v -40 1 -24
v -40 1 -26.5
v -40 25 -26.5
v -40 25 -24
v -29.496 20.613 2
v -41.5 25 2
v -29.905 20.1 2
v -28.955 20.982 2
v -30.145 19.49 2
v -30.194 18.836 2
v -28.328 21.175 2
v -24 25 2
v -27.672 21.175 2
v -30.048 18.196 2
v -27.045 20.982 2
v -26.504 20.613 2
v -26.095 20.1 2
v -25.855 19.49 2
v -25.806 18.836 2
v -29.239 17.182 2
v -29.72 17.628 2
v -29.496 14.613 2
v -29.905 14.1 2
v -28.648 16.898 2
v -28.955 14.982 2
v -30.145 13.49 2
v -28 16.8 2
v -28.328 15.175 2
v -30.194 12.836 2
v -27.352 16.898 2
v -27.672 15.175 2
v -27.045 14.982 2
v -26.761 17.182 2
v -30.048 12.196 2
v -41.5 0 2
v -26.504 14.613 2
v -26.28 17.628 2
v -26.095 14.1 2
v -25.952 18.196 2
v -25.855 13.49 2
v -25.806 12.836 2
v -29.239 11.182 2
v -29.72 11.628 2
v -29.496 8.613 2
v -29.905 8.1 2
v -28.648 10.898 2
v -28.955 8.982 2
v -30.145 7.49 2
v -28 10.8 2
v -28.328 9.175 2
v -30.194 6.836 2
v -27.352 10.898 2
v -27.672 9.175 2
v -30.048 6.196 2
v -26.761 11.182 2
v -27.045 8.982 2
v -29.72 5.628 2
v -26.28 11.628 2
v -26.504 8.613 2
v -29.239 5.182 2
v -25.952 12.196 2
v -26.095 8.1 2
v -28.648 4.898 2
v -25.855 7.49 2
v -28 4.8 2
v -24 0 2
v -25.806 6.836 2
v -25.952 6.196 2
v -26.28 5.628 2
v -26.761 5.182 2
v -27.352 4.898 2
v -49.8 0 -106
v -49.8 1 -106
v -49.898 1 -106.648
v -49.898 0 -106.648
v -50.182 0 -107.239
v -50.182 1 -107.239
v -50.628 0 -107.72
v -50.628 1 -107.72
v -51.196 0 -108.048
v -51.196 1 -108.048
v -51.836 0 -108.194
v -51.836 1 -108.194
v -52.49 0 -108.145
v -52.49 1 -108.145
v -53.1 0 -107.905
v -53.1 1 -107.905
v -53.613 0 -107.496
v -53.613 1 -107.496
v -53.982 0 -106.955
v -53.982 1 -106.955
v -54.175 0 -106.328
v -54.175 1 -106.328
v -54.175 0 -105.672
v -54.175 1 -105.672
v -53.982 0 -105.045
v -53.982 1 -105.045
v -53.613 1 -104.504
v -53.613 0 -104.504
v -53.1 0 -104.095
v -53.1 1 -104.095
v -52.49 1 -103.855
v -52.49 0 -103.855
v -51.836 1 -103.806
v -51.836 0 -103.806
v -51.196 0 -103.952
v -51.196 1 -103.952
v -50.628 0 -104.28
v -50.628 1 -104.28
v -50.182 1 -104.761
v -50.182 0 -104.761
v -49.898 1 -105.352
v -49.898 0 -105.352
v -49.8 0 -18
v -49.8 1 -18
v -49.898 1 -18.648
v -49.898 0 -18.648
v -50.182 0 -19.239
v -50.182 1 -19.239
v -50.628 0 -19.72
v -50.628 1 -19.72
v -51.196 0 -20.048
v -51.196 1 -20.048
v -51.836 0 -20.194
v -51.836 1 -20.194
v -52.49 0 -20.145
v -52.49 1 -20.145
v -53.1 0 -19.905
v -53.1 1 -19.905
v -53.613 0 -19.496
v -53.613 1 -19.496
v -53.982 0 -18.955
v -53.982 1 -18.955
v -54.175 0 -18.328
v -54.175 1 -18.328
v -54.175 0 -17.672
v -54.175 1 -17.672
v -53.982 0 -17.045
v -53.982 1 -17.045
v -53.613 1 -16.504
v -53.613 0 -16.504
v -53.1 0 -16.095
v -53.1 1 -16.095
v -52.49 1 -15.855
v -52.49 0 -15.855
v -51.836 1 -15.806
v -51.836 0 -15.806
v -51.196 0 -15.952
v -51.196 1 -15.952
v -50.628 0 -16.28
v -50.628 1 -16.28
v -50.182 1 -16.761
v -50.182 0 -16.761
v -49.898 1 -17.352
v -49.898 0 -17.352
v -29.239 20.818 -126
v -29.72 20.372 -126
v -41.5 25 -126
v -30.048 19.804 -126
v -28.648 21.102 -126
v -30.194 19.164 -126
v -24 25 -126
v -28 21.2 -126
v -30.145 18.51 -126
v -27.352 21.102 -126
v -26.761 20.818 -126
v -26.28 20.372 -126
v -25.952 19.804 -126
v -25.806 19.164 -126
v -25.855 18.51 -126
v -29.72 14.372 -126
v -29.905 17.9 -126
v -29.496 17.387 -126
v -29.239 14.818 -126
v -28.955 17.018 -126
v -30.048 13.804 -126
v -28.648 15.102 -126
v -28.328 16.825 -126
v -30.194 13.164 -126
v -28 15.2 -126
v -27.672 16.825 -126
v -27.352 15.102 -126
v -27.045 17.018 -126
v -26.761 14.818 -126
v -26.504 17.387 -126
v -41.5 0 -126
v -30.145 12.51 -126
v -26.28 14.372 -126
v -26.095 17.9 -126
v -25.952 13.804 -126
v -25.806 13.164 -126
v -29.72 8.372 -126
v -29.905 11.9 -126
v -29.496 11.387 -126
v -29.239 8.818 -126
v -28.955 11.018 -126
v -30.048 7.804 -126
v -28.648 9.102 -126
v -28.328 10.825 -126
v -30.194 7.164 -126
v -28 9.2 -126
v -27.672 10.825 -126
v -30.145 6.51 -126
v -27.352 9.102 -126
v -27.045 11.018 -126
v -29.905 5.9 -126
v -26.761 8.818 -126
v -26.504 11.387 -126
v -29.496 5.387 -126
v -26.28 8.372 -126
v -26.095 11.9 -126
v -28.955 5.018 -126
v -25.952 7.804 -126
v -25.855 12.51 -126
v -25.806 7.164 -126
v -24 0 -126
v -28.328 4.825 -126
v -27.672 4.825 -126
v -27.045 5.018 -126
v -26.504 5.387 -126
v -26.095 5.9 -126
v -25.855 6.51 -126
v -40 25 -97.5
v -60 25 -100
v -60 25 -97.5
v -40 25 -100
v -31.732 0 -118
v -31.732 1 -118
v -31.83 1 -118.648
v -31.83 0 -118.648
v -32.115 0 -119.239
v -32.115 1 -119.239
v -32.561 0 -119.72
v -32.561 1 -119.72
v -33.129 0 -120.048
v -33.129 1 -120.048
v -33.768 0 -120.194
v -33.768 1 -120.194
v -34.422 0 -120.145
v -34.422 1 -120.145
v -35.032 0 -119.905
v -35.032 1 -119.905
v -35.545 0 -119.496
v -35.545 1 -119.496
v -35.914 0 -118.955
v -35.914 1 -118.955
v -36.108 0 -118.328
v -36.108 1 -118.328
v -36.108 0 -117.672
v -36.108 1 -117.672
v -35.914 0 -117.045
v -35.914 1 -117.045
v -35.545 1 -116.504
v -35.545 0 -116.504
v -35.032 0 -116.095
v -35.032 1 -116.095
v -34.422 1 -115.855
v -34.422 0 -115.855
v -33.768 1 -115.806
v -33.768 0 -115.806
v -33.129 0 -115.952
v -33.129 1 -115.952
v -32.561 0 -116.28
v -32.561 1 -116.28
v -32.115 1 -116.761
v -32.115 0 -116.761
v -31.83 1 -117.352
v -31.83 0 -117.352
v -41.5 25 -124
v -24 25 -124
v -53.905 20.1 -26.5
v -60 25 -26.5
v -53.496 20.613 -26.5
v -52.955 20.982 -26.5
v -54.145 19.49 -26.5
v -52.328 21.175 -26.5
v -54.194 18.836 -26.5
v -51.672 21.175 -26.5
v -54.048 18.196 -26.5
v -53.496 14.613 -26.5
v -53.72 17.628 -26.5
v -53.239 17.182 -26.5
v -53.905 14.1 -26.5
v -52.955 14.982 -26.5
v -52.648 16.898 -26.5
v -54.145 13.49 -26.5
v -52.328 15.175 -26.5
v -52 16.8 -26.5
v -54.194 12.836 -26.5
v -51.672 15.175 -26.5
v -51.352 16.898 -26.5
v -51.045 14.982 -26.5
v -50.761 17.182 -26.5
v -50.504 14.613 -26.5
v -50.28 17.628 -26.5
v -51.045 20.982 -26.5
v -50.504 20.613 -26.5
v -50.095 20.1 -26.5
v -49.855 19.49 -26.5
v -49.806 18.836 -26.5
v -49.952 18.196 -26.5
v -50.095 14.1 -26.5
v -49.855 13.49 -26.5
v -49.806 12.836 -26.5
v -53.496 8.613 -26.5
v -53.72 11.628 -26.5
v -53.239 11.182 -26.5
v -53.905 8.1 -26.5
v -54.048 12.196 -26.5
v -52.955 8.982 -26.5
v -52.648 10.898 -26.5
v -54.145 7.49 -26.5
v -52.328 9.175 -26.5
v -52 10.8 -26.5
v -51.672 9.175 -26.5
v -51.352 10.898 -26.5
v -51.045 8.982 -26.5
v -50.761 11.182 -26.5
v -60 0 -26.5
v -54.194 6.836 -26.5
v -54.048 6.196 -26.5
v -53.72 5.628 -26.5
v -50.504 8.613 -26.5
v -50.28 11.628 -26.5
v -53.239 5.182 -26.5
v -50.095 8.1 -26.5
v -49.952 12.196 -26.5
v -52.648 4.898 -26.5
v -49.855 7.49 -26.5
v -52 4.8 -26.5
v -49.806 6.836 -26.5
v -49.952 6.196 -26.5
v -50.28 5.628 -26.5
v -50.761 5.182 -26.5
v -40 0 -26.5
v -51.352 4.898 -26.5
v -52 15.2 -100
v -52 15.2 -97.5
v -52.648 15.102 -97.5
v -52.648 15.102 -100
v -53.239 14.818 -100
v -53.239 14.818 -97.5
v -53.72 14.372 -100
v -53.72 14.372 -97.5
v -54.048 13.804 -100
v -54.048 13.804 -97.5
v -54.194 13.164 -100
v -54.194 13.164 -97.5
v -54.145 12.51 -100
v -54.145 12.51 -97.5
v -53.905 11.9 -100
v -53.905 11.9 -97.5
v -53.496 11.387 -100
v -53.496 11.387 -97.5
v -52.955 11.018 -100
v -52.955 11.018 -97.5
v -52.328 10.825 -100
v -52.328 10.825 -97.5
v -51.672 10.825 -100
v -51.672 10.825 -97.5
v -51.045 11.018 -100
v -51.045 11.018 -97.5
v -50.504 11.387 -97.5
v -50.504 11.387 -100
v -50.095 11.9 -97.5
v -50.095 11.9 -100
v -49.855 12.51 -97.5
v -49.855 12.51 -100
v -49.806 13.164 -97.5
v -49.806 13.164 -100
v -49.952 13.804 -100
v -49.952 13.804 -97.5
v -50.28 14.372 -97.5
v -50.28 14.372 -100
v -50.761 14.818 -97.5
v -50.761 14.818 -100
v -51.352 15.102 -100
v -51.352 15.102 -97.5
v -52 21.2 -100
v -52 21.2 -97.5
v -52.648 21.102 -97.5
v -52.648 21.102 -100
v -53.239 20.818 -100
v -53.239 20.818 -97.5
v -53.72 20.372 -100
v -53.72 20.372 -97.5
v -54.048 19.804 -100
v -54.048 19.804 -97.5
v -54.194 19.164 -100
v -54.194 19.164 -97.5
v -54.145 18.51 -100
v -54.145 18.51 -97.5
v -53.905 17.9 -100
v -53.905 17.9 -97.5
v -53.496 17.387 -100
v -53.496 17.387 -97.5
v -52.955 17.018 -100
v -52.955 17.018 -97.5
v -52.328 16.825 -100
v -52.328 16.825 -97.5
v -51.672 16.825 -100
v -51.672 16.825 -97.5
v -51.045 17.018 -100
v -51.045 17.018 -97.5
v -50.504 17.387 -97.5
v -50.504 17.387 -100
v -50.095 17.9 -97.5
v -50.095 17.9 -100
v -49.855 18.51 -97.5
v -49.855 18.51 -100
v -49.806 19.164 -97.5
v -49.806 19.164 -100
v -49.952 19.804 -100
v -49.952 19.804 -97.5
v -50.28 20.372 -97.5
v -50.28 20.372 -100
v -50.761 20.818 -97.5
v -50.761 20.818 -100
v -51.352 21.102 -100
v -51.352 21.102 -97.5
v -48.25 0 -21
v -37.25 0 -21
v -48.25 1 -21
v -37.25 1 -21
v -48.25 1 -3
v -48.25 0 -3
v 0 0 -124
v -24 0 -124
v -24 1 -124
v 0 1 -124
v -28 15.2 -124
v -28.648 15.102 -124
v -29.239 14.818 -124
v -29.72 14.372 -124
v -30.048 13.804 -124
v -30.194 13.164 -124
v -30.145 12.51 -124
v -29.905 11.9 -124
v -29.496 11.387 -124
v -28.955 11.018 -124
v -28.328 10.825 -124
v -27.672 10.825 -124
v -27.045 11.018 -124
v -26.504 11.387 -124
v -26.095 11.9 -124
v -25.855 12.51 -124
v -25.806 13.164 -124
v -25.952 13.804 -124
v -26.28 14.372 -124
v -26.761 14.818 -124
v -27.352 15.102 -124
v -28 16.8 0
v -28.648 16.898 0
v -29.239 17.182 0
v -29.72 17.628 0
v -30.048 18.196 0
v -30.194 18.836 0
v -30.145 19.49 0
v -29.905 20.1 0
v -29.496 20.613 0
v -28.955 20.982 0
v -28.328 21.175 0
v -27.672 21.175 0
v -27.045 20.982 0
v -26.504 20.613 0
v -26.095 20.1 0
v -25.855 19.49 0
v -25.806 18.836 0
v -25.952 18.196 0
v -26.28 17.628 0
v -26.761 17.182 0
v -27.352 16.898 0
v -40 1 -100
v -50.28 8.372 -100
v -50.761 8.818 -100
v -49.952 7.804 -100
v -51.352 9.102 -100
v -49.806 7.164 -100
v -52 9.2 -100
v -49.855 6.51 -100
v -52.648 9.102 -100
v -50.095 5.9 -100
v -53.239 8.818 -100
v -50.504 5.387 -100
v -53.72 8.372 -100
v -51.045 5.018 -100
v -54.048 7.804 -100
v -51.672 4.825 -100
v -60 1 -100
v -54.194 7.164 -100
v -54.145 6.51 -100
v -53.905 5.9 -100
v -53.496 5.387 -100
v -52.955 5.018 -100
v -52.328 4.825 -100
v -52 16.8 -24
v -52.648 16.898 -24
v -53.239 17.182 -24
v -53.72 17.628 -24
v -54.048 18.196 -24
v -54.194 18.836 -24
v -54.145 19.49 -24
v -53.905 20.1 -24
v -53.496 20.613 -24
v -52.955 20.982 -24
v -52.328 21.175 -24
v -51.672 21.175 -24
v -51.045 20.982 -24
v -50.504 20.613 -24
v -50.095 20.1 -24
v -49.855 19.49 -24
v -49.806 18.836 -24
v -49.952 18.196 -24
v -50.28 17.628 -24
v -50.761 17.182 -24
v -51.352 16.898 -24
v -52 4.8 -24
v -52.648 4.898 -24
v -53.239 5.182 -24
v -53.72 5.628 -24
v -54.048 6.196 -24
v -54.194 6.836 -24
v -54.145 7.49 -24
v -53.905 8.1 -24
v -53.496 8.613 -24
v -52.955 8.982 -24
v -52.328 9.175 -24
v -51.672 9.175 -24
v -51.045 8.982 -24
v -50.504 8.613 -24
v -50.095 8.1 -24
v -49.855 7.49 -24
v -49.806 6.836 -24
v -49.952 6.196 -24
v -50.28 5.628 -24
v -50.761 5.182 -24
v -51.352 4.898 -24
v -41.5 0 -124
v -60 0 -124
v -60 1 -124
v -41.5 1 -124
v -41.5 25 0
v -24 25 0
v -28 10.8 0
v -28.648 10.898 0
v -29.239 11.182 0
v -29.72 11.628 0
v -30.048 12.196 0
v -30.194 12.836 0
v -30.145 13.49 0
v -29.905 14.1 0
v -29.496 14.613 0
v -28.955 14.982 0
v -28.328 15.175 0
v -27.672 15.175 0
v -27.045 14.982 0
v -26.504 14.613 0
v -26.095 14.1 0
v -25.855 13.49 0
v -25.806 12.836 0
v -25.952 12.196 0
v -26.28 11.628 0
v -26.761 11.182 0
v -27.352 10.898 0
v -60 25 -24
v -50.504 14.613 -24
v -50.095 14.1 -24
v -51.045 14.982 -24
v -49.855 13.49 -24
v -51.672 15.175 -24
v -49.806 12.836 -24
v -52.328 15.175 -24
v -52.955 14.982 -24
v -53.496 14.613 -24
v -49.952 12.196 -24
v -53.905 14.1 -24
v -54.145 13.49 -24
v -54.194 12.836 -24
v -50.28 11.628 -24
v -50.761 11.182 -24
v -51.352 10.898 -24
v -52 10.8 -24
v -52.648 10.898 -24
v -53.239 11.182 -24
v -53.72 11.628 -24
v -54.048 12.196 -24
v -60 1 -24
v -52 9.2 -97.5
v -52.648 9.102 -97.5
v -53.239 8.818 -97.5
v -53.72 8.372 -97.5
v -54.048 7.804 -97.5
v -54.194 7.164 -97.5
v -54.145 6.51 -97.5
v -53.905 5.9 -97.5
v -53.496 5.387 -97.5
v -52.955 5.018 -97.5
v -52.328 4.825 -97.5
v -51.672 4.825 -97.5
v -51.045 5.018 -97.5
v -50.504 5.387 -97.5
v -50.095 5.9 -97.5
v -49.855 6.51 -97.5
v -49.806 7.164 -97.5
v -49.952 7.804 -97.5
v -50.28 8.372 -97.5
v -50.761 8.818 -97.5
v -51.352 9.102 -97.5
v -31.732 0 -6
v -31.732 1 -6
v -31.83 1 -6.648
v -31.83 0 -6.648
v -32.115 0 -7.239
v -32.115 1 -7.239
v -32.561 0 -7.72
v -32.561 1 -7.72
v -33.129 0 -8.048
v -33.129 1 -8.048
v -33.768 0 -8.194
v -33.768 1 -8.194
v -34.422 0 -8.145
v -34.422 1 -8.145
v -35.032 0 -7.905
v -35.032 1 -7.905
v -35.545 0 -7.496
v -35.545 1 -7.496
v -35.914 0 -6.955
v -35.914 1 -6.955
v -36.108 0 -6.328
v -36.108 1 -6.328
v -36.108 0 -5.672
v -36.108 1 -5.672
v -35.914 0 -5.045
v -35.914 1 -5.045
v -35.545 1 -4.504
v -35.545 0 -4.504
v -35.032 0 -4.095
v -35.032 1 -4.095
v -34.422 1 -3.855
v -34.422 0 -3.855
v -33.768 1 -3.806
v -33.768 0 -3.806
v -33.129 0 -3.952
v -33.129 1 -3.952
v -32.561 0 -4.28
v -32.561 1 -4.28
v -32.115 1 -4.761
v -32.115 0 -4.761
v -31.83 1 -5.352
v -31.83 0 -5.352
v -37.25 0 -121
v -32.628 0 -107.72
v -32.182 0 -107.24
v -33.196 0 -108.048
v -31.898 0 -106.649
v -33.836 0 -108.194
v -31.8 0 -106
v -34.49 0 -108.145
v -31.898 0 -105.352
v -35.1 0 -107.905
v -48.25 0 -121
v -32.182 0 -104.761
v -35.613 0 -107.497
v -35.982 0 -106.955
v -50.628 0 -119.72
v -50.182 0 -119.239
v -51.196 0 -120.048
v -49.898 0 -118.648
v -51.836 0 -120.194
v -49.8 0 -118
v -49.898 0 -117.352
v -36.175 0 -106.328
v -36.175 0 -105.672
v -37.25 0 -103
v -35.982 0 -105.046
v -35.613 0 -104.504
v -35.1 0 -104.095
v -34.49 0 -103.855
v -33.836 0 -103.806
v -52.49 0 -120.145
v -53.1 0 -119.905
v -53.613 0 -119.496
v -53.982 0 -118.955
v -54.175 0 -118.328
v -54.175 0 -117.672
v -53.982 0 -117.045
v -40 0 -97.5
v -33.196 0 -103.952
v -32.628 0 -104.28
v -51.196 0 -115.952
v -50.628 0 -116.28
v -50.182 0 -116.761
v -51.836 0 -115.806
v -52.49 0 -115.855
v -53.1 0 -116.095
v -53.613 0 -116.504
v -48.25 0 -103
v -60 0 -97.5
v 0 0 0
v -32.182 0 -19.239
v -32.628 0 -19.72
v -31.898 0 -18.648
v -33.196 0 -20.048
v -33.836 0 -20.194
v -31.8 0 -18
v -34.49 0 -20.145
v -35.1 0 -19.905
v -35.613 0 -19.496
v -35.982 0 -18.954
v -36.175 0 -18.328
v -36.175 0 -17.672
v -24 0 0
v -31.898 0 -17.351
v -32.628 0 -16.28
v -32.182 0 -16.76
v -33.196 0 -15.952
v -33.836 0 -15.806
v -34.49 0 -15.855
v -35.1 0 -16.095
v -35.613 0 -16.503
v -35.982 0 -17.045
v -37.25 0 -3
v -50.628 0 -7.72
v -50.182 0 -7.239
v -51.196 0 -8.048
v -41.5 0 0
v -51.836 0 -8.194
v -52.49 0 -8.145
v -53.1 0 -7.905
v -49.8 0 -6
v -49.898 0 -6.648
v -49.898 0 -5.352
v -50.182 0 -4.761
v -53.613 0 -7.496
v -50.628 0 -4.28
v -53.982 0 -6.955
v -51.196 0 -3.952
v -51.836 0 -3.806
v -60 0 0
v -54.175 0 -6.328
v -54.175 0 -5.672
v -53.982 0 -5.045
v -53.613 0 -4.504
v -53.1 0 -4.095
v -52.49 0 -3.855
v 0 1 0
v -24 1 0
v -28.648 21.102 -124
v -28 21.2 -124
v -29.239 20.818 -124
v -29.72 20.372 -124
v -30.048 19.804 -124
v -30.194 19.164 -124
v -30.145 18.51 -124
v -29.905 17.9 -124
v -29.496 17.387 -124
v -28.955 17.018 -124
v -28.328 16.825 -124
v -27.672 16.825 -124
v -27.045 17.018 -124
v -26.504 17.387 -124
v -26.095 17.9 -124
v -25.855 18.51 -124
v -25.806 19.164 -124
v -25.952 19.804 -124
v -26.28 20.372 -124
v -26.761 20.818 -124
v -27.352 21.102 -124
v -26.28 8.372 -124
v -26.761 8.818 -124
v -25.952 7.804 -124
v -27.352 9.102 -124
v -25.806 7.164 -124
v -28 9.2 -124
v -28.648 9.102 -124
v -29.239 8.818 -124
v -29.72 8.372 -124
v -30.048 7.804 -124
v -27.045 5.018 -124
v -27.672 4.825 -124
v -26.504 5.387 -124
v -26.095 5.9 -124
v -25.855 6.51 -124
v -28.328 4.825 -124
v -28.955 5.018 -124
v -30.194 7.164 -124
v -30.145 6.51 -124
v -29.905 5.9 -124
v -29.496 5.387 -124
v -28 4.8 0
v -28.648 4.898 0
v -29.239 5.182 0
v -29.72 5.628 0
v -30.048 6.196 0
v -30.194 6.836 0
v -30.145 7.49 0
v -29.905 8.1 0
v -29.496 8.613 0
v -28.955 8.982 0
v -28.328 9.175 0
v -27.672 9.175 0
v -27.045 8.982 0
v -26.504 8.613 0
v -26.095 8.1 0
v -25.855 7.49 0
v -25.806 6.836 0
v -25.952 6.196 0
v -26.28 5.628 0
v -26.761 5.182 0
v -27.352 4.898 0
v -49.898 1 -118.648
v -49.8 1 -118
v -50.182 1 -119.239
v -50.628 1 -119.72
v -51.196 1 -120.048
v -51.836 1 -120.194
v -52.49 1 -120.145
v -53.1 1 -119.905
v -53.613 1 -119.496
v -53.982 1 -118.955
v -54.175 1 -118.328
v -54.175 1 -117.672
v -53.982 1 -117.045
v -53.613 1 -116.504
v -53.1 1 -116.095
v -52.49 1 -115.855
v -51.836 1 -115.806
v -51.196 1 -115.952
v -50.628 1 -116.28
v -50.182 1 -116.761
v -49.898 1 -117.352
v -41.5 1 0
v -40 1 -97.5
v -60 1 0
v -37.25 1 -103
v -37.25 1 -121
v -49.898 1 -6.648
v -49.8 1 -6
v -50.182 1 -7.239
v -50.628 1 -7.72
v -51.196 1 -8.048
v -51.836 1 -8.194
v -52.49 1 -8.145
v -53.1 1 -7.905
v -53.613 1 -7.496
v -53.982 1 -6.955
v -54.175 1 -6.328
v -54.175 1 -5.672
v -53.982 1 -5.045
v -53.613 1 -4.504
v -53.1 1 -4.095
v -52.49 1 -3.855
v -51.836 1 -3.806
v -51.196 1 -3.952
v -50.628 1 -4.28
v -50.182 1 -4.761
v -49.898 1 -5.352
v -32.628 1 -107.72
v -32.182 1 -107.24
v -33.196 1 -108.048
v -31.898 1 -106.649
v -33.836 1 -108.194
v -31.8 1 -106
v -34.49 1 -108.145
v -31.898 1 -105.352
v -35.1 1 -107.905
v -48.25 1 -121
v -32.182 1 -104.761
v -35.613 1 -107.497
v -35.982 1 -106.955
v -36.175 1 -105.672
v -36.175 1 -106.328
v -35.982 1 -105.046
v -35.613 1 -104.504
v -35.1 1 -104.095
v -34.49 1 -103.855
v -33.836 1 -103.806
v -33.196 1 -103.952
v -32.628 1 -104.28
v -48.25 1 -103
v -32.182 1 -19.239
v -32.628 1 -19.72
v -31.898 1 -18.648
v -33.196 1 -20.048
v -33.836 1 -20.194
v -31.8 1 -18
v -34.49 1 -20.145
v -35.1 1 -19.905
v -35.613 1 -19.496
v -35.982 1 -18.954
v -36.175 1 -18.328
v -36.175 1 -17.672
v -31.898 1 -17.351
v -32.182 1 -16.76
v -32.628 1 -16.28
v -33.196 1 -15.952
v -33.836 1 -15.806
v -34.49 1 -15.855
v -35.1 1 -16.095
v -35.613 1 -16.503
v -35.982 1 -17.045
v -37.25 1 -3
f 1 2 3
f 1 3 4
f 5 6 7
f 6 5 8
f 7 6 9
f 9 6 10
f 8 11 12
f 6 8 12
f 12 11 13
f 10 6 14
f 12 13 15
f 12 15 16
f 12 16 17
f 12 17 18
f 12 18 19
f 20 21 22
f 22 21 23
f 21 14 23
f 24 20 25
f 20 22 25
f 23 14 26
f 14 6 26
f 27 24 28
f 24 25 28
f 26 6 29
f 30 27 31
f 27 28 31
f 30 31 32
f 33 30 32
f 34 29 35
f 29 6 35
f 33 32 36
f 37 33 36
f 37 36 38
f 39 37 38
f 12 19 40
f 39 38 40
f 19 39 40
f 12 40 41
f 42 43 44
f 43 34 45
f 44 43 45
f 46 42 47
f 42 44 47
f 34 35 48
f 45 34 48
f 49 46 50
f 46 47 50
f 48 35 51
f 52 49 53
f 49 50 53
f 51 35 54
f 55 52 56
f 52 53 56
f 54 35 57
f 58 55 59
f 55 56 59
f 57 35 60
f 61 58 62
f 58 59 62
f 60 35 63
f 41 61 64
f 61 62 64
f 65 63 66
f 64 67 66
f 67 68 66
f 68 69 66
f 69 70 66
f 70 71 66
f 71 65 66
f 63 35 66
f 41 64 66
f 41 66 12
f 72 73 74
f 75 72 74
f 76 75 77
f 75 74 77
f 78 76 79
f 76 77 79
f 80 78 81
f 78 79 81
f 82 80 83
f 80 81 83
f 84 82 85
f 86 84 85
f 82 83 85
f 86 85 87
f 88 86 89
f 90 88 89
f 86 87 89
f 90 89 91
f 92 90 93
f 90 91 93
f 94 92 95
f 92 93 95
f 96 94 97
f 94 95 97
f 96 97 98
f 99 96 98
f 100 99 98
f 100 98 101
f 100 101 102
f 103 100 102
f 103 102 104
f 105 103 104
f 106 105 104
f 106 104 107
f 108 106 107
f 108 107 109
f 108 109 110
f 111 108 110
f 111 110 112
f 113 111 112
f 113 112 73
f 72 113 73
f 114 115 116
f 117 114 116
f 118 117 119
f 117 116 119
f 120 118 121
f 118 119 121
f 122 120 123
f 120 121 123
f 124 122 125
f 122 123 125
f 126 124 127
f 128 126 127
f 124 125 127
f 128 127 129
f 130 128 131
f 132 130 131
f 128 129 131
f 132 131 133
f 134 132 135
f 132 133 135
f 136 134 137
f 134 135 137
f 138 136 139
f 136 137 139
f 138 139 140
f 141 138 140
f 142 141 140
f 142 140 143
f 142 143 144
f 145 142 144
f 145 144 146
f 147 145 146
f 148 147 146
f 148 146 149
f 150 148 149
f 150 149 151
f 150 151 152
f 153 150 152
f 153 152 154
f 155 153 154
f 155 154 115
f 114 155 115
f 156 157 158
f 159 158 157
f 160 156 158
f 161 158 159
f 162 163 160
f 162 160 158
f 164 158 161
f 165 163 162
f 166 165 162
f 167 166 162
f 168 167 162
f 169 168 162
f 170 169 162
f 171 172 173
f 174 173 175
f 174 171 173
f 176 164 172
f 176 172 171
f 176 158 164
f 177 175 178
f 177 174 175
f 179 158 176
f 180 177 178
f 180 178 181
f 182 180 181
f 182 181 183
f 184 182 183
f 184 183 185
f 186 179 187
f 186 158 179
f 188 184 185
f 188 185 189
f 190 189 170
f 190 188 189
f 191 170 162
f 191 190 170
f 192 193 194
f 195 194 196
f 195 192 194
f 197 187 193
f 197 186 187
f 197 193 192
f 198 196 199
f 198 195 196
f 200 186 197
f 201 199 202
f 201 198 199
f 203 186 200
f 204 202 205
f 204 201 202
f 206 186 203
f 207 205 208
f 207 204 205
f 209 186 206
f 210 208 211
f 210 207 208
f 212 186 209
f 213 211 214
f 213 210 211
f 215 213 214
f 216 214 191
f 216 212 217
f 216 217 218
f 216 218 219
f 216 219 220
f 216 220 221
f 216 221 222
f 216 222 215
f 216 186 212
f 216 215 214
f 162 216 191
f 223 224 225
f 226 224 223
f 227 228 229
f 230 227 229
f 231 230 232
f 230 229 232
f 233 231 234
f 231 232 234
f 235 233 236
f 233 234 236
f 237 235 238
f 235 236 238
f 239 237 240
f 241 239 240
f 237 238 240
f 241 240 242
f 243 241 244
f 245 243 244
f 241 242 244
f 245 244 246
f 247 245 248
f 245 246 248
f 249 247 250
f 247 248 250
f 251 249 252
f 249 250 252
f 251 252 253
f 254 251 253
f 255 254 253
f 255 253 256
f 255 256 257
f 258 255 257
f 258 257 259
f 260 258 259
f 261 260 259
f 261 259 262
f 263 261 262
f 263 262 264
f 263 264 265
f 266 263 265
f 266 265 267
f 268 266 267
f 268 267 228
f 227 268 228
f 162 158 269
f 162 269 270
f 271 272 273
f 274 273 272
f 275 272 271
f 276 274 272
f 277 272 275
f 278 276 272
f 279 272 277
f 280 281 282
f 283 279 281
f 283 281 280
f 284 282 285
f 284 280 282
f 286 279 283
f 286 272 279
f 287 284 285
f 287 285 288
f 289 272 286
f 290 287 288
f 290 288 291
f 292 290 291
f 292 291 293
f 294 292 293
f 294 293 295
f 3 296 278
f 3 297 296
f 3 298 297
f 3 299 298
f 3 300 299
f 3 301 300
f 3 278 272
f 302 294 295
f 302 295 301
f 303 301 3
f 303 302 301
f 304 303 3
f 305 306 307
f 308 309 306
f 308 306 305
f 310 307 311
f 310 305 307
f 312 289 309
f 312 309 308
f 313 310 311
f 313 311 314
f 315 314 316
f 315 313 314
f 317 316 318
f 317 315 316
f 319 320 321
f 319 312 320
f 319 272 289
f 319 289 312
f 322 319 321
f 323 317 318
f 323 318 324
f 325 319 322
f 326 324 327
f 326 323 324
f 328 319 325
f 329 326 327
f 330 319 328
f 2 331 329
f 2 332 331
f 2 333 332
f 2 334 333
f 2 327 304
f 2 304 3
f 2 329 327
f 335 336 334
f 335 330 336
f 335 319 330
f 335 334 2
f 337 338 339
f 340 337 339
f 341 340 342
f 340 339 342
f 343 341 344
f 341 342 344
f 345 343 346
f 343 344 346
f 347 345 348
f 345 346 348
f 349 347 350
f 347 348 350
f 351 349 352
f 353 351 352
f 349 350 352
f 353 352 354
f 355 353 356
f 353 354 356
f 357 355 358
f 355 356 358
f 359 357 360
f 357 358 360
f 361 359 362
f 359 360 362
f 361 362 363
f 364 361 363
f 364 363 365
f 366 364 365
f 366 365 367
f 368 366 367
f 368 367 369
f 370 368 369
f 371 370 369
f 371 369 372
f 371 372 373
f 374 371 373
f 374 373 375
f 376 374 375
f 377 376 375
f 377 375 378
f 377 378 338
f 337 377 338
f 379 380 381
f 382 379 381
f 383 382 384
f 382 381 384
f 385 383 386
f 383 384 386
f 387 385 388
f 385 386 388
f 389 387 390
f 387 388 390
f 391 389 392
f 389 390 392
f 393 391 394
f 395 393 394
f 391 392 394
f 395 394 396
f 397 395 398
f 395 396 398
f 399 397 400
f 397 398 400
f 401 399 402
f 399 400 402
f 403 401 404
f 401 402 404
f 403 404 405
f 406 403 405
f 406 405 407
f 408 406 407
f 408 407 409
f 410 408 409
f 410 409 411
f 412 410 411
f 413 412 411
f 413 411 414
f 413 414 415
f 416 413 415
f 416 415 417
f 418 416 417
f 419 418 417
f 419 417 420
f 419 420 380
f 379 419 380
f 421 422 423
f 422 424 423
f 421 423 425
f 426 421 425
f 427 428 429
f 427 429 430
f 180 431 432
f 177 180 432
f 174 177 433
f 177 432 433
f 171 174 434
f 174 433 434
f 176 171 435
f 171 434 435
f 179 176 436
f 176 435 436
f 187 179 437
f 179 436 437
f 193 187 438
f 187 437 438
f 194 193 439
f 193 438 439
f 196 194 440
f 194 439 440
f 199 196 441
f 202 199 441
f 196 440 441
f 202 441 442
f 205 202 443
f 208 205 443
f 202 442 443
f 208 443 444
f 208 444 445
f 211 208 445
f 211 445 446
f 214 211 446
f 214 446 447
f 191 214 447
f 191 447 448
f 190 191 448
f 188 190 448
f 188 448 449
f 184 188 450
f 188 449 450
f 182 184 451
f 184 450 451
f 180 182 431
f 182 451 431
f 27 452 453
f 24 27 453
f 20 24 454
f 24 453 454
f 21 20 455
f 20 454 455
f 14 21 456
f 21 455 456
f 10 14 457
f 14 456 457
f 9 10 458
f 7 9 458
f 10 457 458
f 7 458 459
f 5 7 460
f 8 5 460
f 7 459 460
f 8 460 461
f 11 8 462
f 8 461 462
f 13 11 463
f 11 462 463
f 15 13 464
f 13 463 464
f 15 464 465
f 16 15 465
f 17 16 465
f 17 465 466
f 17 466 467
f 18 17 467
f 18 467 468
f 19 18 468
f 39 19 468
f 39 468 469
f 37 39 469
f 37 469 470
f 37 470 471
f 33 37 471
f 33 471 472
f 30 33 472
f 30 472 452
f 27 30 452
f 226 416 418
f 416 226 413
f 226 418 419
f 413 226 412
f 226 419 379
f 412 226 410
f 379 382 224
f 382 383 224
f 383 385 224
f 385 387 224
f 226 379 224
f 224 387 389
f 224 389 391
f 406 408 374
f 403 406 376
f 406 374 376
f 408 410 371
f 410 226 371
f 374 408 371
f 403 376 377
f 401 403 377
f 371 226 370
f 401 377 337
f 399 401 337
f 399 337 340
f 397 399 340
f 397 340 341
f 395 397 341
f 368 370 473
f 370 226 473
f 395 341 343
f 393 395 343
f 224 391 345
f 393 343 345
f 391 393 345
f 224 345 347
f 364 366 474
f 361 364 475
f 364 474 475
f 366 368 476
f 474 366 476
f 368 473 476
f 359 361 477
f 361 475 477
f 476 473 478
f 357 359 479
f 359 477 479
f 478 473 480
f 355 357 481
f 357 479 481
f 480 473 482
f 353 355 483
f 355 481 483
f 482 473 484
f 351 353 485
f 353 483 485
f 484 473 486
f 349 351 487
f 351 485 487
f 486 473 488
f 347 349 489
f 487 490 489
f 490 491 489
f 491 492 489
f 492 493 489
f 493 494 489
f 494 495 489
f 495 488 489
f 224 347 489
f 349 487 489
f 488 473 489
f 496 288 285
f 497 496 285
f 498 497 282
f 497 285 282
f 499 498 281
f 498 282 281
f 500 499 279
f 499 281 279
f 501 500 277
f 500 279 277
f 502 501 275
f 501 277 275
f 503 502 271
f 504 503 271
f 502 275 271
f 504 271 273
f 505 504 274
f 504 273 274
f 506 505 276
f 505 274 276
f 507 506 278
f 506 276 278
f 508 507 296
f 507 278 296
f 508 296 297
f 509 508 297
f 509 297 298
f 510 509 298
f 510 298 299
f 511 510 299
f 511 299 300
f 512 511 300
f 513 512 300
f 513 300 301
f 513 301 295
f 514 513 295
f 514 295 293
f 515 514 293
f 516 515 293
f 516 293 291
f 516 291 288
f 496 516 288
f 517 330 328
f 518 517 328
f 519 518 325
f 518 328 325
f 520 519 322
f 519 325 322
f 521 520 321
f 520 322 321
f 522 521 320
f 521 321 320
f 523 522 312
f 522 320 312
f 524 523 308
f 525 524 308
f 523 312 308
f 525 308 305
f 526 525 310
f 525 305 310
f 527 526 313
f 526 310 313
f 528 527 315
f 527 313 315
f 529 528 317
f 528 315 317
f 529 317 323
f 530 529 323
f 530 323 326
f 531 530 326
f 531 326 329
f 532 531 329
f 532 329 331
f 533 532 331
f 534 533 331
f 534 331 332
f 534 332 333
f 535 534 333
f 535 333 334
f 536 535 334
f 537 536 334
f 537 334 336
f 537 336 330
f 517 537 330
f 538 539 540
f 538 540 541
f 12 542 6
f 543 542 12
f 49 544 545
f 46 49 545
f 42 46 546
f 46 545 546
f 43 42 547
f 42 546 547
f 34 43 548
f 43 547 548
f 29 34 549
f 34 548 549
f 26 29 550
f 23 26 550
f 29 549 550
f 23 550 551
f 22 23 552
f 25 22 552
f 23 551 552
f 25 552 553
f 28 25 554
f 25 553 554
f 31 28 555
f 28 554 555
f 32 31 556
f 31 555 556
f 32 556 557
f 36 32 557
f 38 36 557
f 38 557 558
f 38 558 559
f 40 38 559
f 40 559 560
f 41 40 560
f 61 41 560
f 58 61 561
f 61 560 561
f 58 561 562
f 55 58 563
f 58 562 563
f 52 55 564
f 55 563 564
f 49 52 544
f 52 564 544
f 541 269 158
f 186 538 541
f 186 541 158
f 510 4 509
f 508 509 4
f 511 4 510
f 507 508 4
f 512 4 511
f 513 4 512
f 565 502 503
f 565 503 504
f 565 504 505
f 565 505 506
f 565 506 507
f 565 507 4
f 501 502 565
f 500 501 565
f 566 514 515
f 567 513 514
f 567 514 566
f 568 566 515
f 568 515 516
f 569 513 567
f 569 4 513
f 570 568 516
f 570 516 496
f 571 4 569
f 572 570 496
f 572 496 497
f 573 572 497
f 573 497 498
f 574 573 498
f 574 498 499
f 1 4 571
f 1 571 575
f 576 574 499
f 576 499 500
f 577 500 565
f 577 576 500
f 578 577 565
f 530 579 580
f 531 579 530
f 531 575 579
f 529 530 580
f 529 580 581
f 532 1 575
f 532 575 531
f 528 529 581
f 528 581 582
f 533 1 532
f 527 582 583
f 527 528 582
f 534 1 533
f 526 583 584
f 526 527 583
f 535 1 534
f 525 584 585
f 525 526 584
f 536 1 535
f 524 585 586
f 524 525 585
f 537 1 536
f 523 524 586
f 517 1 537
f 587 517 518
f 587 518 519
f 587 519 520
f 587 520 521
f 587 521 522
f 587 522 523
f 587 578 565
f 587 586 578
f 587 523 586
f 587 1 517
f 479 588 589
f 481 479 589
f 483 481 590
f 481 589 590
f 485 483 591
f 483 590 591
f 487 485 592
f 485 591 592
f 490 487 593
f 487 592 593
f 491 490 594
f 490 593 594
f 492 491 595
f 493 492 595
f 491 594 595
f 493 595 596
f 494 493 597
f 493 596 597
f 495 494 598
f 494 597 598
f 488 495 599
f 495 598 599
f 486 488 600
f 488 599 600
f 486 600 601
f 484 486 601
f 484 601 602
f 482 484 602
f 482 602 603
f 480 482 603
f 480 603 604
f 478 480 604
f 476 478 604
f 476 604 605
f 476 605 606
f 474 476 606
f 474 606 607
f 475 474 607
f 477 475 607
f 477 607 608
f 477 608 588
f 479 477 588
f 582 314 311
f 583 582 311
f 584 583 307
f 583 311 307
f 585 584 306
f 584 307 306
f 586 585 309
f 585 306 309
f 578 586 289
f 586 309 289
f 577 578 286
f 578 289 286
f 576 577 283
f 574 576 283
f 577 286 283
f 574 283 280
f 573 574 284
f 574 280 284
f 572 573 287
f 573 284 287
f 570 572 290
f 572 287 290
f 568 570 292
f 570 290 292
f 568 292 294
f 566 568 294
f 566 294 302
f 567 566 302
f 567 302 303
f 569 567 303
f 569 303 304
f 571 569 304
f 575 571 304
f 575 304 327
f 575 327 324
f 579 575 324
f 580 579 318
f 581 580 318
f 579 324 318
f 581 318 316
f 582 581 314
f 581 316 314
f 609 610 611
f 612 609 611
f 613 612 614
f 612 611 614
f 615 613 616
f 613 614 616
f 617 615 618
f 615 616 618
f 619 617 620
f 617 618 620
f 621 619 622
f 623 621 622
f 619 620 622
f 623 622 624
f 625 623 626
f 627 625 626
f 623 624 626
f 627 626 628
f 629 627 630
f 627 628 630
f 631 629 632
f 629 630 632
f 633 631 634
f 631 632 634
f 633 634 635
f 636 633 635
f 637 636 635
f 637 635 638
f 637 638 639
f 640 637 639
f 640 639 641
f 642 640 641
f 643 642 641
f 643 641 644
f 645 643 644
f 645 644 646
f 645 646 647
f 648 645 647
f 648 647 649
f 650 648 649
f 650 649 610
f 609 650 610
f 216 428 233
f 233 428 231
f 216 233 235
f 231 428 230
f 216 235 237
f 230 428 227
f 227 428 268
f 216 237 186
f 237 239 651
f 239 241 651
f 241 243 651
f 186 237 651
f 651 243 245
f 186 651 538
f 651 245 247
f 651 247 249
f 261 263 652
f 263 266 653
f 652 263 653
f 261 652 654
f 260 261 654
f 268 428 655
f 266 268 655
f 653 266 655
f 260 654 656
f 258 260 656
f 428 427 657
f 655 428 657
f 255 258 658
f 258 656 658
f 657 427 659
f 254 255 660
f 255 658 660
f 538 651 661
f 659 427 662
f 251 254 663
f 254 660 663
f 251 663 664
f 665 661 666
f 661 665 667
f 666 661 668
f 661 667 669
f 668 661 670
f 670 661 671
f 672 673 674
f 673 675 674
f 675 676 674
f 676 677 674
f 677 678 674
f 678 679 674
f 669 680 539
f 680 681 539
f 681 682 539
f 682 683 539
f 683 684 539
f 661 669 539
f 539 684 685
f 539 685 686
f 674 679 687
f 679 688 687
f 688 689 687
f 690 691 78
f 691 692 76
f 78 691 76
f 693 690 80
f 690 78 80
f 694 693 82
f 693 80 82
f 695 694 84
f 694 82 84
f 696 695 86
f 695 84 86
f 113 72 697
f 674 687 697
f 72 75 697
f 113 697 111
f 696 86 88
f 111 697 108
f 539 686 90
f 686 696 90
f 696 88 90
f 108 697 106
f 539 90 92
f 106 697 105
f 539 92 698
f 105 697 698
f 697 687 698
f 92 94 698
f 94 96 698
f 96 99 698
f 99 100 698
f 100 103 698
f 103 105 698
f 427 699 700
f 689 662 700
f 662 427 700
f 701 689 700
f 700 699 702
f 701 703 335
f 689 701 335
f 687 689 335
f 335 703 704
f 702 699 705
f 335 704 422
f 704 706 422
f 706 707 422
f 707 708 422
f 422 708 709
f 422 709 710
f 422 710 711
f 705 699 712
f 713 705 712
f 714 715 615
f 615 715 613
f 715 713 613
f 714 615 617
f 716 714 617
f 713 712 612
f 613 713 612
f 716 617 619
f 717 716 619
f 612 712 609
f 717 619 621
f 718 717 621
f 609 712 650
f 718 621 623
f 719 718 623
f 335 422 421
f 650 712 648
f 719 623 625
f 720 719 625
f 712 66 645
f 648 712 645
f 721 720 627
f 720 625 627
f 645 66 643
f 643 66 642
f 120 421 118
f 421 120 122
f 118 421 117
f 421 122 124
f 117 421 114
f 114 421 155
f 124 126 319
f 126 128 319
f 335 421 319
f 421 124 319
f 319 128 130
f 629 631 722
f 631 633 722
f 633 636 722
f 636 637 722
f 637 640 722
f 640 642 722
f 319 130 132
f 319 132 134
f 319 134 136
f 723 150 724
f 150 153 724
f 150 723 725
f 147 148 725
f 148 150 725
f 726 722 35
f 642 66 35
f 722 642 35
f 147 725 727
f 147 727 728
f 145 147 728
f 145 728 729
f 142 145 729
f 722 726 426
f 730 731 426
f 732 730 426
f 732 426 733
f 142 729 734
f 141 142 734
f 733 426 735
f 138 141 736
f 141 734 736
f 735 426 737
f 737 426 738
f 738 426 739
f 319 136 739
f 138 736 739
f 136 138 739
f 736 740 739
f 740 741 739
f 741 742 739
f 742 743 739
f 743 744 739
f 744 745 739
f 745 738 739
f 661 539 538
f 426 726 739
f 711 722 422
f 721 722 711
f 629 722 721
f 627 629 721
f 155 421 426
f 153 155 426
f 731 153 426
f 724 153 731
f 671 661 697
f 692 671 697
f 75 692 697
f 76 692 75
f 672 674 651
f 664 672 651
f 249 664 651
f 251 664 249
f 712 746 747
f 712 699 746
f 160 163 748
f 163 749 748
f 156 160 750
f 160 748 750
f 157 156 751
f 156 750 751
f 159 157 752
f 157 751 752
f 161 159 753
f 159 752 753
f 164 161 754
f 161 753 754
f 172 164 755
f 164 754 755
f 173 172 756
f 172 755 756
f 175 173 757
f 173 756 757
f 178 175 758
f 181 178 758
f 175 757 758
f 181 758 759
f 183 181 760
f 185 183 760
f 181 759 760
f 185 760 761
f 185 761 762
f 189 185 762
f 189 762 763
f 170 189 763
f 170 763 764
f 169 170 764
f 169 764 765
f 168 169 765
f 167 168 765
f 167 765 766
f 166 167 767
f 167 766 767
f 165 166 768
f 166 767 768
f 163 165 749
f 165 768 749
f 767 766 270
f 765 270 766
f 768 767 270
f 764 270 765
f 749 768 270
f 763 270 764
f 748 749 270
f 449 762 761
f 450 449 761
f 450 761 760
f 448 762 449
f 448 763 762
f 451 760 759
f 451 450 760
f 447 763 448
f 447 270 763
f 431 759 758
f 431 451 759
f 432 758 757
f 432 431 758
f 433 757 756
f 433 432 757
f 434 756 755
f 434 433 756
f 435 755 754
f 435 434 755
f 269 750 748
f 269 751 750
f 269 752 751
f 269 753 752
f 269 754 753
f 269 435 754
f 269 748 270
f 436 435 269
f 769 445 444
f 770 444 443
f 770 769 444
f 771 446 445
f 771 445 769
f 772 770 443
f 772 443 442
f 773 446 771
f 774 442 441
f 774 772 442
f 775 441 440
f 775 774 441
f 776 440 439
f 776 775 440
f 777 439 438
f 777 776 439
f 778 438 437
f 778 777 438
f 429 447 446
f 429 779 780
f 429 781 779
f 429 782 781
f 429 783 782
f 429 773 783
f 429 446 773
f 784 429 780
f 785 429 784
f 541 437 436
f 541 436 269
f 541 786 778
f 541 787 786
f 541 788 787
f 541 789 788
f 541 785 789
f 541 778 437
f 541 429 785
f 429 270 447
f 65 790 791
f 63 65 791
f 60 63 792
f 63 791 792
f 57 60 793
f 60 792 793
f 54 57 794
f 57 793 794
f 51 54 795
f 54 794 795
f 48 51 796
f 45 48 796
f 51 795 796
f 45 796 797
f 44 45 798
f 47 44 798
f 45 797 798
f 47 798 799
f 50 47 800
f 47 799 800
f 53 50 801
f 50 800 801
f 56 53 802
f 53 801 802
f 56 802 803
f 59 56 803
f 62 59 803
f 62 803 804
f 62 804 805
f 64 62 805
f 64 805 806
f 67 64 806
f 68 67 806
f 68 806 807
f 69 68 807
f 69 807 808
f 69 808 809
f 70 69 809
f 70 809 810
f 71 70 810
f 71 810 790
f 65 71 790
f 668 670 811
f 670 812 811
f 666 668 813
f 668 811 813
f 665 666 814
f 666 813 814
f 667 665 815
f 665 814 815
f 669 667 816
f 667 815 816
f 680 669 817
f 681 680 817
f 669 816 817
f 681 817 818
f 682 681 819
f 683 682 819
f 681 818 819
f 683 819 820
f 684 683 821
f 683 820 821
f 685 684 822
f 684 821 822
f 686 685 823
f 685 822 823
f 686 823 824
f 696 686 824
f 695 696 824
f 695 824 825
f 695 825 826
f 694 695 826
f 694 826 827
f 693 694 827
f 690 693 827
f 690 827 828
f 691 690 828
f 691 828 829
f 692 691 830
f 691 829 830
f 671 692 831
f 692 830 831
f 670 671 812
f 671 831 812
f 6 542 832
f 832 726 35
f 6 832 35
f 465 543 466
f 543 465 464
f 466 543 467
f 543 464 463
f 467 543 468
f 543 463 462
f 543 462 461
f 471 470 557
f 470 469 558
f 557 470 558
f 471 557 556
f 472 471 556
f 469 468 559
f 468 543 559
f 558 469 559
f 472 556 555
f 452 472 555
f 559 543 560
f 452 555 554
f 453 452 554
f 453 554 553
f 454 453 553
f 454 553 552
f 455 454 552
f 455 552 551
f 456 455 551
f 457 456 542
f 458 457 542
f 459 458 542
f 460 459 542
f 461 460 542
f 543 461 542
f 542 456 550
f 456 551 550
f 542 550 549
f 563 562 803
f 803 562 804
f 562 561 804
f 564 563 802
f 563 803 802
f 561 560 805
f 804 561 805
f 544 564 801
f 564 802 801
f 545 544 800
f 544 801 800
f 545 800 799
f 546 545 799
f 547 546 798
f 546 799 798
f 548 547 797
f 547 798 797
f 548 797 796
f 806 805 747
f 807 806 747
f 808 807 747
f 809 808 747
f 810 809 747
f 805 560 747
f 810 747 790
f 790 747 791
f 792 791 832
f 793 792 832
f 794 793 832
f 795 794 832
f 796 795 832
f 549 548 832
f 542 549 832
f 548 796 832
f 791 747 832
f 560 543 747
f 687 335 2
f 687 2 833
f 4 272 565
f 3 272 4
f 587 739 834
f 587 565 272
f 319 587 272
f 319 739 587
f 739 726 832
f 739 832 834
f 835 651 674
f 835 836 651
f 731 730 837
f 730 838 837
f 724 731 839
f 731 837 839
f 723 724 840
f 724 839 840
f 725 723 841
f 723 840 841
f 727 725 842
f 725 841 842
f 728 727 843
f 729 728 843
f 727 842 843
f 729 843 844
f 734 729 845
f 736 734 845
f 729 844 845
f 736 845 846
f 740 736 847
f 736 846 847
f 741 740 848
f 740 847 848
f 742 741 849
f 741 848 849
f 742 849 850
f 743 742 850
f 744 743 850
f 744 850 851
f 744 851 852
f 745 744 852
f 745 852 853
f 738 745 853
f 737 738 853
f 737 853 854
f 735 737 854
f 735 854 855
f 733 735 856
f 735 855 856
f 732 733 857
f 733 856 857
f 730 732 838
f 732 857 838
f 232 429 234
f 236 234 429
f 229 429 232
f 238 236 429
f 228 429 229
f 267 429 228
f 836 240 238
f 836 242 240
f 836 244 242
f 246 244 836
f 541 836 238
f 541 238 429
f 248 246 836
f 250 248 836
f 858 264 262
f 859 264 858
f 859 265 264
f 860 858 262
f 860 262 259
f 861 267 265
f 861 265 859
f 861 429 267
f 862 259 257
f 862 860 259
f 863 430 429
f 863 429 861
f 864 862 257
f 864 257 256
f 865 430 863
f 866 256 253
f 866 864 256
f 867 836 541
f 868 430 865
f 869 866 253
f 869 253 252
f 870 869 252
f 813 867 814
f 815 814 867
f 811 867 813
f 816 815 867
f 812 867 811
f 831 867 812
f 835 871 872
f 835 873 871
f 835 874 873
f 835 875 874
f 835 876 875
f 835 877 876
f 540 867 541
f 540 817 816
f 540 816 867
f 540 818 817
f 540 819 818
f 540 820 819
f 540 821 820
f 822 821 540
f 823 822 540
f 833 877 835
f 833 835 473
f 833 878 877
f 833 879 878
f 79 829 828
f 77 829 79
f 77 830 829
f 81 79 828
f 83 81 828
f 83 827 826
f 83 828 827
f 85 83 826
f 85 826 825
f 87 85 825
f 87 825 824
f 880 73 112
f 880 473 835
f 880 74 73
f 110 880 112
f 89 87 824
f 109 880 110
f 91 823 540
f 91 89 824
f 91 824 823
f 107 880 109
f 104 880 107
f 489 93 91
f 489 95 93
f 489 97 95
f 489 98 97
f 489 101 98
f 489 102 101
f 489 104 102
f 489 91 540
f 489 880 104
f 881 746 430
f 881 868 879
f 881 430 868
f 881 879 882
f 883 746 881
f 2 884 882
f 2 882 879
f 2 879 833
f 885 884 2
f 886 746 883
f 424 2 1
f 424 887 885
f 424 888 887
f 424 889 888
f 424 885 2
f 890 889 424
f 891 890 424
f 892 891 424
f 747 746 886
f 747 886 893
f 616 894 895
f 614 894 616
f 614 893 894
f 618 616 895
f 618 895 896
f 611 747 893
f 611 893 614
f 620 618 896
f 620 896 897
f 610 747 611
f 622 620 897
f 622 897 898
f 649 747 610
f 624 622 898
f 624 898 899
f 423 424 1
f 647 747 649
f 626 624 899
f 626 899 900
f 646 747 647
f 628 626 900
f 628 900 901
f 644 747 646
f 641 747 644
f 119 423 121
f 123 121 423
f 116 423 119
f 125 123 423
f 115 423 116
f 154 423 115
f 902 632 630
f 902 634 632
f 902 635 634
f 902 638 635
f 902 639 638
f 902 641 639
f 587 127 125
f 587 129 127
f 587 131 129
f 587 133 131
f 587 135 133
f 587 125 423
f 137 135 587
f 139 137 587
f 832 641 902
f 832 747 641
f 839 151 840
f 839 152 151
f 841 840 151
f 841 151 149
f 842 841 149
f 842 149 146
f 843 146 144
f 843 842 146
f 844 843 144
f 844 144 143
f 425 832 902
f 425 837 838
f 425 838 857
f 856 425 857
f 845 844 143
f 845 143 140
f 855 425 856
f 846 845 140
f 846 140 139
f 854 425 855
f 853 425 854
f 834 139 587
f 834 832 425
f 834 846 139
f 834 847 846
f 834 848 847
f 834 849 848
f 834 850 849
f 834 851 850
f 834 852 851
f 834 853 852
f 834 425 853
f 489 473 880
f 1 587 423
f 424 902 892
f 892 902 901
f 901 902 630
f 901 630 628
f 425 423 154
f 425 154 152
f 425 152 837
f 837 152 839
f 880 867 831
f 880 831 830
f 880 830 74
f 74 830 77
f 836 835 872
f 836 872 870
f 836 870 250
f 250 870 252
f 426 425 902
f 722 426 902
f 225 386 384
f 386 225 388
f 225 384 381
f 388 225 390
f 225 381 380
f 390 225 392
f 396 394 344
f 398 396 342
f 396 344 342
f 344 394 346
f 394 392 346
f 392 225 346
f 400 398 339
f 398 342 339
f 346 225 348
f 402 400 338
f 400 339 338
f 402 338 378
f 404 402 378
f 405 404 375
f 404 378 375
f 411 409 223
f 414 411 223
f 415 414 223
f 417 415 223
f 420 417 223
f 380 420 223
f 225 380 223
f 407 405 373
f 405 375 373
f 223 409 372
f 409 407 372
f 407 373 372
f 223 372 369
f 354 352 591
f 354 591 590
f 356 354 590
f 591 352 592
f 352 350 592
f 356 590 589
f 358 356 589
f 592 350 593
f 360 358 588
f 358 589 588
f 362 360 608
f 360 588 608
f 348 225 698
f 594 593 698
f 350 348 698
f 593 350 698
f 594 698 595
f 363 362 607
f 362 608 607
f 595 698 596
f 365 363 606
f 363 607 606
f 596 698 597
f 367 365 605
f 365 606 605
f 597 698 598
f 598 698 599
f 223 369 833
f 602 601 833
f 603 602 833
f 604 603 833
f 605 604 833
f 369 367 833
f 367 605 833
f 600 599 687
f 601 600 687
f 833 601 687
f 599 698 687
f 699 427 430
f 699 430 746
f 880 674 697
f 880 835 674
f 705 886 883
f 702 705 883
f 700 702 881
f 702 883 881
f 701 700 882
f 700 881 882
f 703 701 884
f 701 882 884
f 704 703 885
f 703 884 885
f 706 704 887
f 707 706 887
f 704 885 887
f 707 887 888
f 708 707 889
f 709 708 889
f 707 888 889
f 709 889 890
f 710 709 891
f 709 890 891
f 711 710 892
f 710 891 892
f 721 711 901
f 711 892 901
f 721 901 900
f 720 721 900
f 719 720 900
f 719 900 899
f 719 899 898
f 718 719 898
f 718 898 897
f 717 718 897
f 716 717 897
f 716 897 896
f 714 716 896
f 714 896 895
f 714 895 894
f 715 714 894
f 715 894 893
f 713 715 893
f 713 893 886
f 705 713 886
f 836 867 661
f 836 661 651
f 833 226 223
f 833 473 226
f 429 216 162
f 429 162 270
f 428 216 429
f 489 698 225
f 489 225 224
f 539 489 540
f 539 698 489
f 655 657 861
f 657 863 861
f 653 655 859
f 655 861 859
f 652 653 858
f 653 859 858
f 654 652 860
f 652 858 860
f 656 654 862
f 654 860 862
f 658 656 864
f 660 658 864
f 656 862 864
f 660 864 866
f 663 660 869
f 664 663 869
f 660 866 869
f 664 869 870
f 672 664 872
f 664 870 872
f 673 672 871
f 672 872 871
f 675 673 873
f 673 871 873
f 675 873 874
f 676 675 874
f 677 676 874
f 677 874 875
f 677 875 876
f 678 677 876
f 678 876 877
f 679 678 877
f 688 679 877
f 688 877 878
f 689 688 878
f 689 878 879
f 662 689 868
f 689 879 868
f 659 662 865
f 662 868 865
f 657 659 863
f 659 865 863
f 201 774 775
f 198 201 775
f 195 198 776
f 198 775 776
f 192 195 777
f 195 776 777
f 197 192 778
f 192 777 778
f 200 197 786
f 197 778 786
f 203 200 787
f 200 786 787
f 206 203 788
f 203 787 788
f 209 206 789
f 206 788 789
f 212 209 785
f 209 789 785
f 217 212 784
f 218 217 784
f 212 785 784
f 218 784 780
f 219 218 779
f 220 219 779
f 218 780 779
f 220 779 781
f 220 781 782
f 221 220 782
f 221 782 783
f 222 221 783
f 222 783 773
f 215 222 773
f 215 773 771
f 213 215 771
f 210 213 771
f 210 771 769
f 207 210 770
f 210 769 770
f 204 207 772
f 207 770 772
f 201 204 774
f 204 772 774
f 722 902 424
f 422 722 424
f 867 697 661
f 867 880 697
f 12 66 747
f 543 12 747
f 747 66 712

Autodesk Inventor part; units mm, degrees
ref_plane "YZ Plane" through (0, 0, 0) normal (1, 0, 0) x (0, 1, 0)
ref_plane "XZ Plane" through (0, 0, 0) normal (0, 1, 0) x (-1, 0, 0)
ref_plane "XY Plane" through (0, 0, 0) normal (0, 0, 1) x (1, 0, 0)
sketch "Sketch1" plane through (0, 0, 0) normal (0, 1, 0) x (-1, 0, 0)
  line L0 (0, 0) -> (60, 0)
  line L1 (60, 0) -> (60, -24)
  line L2 (60, -24) -> (40, -24)
  line L3 (40, -24) -> (40, -100)
  line L4 (40, -100) -> (60, -100)
  line L5 (60, -100) -> (60, -124)
  line L6 (60, -124) -> (0, -124)
  line L7 (0, -124) -> (0, 0)
  dimension "d0" = 60
  dimension "d1" = 24
  dimension "d2" = 20
  dimension "d3" = 76
  dimension "d4" = 20
  dimension "d5" = 24
extrude "Extrusion1" add sketch "Sketch1" along normal blind 1
sketch "Sketch2" plane through (0, 1, 0) normal (0, 1, 0) x (1, 0, 0)
  circle A0 centre (-52, 6) radius 2.2
  line L0 (-60, 0) -> (0, 0) projected
  line L1 (-60, 24) -> (-60, 0) projected
  circle A1 centre (-52, 18) radius 2.2
  line L2 (-48.25, 3) -> (-37.25, 3)
  line L3 (-37.25, 3) -> (-37.25, 21)
  line L4 (-37.25, 21) -> (-48.25, 21)
  line L5 (-48.25, 21) -> (-48.25, 3)
  circle A2 centre (-34, 17.9998) radius 2.2
  circle A3 centre (-33.9323, 6) radius 2.2
  line L6 (-40, 100) -> (-40, 24) projected
  line L7 (-40, 62) -> (0, 62)
  circle A4 centre (-52, 118) radius 2.2
  circle A5 centre (-52, 106) radius 2.2
  line L8 (-48.25, 121) -> (-37.25, 121)
  line L9 (-37.25, 121) -> (-37.25, 103)
  line L10 (-37.25, 103) -> (-48.25, 103)
  line L11 (-48.25, 103) -> (-48.25, 121)
  circle A6 centre (-34, 106.0002) radius 2.2
  circle A7 centre (-33.9323, 118) radius 2.2
  line L12 (-60, 124) -> (0, 124) projected
  line L13 (-60, 124) -> (-60, 100) projected
  dimension "d8" = 4.4
  dimension "d9" = 6
  dimension "d10" = 8
  dimension "d11" = 4.4
  dimension "d12" = 12
  dimension "d13" = 11
  dimension "d14" = 18
  dimension "d15" = 3
  dimension "d16" = 3.75
  dimension "d17" = 4.4
  dimension "d18" = 3.25
  dimension "d19" = 4.4
  dimension "d20" = 6
  dimension "d21" = 8
  dimension "d22" = 8
extrude "Extrusion2" cut sketch "Sketch2" against normal blind 1.5
sketch "Sketch4" plane through (0, 1, 0) normal (0, 1, 0) x (1, 0, 0)
  line L0 (-60, 124) -> (-60, 100) projected
  line L1 (-60, 100) -> (-60, 97.5)
  line L2 (-60, 97.5) -> (-40, 97.5)
  line L3 (-40, 100) -> (-40, 24) projected
  line L4 (-40, 24) -> (-60, 24) projected
  line L5 (-60, 24) -> (-60, 26.5)
  line L6 (-60, 26.5) -> (-40, 26.5)
  line L7 (-40, 100) -> (-60, 100) projected
  line L8 (-40, 24) -> (-40, 100) projected
  line L9 (-60, 100) -> (-40, 100)
  line L10 (-40, 100) -> (-40, 97.5)
  line L11 (-60, 24) -> (-40, 24)
  line L12 (-40, 26.5) -> (-40, 24)
  line L13 (-60, 124) -> (-41.5, 124)
  line L14 (0, 124) -> (-60, 124) projected
  line L15 (-41.5, 124) -> (-41.5, 126)
  line L16 (-41.5, 126) -> (-24, 126)
  line L17 (-24, 126) -> (-24, 124)
  line L18 (-41.5, 124) -> (-24, 124)
  line L19 (-40, 62) -> (-22.3006, 62)
  line L20 (0, 0) -> (-60, 0)
  line L21 (-41.5, 0) -> (-41.5, -2)
  line L22 (-41.5, -2) -> (-24, -2)
  line L23 (-24, -2) -> (-24, 0)
  line L24 (-60, 0) -> (0, 0) projected
  dimension "d29" = 2.5
  dimension "d30" = 2.5
  dimension "d32" = 18.5
  dimension "d33" = 2
  dimension "d34" = 17.5
extrude "Extrusion3" add sketch "Sketch4" along normal blind 24 and the other way blind 1
sketch "Sketch6" plane through (-24, 25, -126) normal (0, 0, -1) x (-1, 0, 0)
  circle A0 centre (4, -6) radius 2.2
  line L0 (0, -25) -> (0, 0) projected
  line L1 (0, 0) -> (17.5, 0) projected
  circle A1 centre (4, -12) radius 2.2
  circle A2 centre (4, -18) radius 2.2
  line L2 (0, 0) -> (0, -24) projected
  line L3 (17.5003, -24) -> (0, -24)
  point P0 (-24, -25)
  dimension "d39" = 4.4
  dimension "d40" = 4
  dimension "d41" = 6
  dimension "d42" = 4.4
  dimension "d43" = 4.4
  dimension "d44" = 6
  dimension "d45" = 6
  dimension "d46" = 6
hole "Hole1" at (-28, 7, -126) at (-28, 13, -126) at (-28, 19, -126) direction (0, 0, 1) diameter 4.4 depth 2
sketch "Sketch7" plane through (-41.5, 25, 2) normal (0, 0, 1) x (1, 0, 0)
  line L0 (17.5, -24) -> (0, -24) projected
  line L1 (0, -24) -> (0, -25) projected
  line L2 (17.5, -24) -> (0, -24)
  circle A0 centre (13.5, -18) radius 2.2 projected
  circle A1 centre (13.5, -18) radius 2.2
  circle A2 centre (13.5, -12) radius 2.2 projected
  circle A3 centre (13.5, -12) radius 2.2
  circle A4 centre (13.5, -6) radius 2.2 projected
  circle A5 centre (13.5, -6) radius 2.2
  point P0 (41.5, -25)
  dimension "d54" = 4.4
  dimension "d55" = 4.4
  dimension "d56" = 4.4
hole "Hole2" at (-28, 7, 2) at (-28, 13, 2) at (-28, 19, 2) direction (0, 0, -1) diameter 4.4 depth 2
sketch "Sketch11" plane through (-60, 1, -100) normal (0, 0, -1) x (-1, 0, 0)
  circle A0 centre (-8, 18) radius 2.2
  line L0 (0, 24) -> (0, 0) projected
  line L1 (-20, 24) -> (0, 24) projected
  circle A1 centre (-8, 12) radius 2.2
  circle A2 centre (-8, 6) radius 2.2
  circle A3 centre (-31.5, 6) radius 2.2
  circle A4 centre (-31.5, 12) radius 2.2
  circle A5 centre (-31.5, 18) radius 2.2
  point P0 (-60, -1)
  point P1 (-36, 24)
  dimension "d68" = 4.4
  dimension "d69" = 8
  dimension "d70" = 6
  dimension "d71" = 4.4
  dimension "d72" = 4.4
  dimension "d73" = 6
  dimension "d74" = 6
  dimension "d82" = 4.4
  dimension "d83" = 23.5
  dimension "d84" = 4.4
  dimension "d85" = 4.4
hole "Hole3" at (-52, 19, -100) at (-52, 13, -100) at (-52, 7, -100) direction (0, 0, 1) diameter 4.4 depth 2.5
sketch "Sketch12" plane through (-60, 1, -24) normal (0, 0, 1) x (1, 0, 0)
  circle A0 centre (8, 6) radius 2.2 projected
  circle A1 centre (8, 6) radius 2.2
  circle A2 centre (8, 12) radius 2.2 projected
  circle A3 centre (8, 12) radius 2.2
  circle A4 centre (8, 18) radius 2.2 projected
  circle A5 centre (8, 18) radius 2.2
  point P0 (60, -1)
  dimension "d86" = 4.4
  dimension "d87" = 4.4
  dimension "d88" = 4.4
hole "Hole4" at (-52, 7, -24) at (-52, 13, -24) at (-52, 19, -24) direction (0, 0, -1) diameter 4.4 depth 2.5
sketch "Sketch13" plane through (-60, 1, -24) normal (0, 0, 1) x (1, 0, 0)
  point P0 (60, -1)
properties part number "brace"
